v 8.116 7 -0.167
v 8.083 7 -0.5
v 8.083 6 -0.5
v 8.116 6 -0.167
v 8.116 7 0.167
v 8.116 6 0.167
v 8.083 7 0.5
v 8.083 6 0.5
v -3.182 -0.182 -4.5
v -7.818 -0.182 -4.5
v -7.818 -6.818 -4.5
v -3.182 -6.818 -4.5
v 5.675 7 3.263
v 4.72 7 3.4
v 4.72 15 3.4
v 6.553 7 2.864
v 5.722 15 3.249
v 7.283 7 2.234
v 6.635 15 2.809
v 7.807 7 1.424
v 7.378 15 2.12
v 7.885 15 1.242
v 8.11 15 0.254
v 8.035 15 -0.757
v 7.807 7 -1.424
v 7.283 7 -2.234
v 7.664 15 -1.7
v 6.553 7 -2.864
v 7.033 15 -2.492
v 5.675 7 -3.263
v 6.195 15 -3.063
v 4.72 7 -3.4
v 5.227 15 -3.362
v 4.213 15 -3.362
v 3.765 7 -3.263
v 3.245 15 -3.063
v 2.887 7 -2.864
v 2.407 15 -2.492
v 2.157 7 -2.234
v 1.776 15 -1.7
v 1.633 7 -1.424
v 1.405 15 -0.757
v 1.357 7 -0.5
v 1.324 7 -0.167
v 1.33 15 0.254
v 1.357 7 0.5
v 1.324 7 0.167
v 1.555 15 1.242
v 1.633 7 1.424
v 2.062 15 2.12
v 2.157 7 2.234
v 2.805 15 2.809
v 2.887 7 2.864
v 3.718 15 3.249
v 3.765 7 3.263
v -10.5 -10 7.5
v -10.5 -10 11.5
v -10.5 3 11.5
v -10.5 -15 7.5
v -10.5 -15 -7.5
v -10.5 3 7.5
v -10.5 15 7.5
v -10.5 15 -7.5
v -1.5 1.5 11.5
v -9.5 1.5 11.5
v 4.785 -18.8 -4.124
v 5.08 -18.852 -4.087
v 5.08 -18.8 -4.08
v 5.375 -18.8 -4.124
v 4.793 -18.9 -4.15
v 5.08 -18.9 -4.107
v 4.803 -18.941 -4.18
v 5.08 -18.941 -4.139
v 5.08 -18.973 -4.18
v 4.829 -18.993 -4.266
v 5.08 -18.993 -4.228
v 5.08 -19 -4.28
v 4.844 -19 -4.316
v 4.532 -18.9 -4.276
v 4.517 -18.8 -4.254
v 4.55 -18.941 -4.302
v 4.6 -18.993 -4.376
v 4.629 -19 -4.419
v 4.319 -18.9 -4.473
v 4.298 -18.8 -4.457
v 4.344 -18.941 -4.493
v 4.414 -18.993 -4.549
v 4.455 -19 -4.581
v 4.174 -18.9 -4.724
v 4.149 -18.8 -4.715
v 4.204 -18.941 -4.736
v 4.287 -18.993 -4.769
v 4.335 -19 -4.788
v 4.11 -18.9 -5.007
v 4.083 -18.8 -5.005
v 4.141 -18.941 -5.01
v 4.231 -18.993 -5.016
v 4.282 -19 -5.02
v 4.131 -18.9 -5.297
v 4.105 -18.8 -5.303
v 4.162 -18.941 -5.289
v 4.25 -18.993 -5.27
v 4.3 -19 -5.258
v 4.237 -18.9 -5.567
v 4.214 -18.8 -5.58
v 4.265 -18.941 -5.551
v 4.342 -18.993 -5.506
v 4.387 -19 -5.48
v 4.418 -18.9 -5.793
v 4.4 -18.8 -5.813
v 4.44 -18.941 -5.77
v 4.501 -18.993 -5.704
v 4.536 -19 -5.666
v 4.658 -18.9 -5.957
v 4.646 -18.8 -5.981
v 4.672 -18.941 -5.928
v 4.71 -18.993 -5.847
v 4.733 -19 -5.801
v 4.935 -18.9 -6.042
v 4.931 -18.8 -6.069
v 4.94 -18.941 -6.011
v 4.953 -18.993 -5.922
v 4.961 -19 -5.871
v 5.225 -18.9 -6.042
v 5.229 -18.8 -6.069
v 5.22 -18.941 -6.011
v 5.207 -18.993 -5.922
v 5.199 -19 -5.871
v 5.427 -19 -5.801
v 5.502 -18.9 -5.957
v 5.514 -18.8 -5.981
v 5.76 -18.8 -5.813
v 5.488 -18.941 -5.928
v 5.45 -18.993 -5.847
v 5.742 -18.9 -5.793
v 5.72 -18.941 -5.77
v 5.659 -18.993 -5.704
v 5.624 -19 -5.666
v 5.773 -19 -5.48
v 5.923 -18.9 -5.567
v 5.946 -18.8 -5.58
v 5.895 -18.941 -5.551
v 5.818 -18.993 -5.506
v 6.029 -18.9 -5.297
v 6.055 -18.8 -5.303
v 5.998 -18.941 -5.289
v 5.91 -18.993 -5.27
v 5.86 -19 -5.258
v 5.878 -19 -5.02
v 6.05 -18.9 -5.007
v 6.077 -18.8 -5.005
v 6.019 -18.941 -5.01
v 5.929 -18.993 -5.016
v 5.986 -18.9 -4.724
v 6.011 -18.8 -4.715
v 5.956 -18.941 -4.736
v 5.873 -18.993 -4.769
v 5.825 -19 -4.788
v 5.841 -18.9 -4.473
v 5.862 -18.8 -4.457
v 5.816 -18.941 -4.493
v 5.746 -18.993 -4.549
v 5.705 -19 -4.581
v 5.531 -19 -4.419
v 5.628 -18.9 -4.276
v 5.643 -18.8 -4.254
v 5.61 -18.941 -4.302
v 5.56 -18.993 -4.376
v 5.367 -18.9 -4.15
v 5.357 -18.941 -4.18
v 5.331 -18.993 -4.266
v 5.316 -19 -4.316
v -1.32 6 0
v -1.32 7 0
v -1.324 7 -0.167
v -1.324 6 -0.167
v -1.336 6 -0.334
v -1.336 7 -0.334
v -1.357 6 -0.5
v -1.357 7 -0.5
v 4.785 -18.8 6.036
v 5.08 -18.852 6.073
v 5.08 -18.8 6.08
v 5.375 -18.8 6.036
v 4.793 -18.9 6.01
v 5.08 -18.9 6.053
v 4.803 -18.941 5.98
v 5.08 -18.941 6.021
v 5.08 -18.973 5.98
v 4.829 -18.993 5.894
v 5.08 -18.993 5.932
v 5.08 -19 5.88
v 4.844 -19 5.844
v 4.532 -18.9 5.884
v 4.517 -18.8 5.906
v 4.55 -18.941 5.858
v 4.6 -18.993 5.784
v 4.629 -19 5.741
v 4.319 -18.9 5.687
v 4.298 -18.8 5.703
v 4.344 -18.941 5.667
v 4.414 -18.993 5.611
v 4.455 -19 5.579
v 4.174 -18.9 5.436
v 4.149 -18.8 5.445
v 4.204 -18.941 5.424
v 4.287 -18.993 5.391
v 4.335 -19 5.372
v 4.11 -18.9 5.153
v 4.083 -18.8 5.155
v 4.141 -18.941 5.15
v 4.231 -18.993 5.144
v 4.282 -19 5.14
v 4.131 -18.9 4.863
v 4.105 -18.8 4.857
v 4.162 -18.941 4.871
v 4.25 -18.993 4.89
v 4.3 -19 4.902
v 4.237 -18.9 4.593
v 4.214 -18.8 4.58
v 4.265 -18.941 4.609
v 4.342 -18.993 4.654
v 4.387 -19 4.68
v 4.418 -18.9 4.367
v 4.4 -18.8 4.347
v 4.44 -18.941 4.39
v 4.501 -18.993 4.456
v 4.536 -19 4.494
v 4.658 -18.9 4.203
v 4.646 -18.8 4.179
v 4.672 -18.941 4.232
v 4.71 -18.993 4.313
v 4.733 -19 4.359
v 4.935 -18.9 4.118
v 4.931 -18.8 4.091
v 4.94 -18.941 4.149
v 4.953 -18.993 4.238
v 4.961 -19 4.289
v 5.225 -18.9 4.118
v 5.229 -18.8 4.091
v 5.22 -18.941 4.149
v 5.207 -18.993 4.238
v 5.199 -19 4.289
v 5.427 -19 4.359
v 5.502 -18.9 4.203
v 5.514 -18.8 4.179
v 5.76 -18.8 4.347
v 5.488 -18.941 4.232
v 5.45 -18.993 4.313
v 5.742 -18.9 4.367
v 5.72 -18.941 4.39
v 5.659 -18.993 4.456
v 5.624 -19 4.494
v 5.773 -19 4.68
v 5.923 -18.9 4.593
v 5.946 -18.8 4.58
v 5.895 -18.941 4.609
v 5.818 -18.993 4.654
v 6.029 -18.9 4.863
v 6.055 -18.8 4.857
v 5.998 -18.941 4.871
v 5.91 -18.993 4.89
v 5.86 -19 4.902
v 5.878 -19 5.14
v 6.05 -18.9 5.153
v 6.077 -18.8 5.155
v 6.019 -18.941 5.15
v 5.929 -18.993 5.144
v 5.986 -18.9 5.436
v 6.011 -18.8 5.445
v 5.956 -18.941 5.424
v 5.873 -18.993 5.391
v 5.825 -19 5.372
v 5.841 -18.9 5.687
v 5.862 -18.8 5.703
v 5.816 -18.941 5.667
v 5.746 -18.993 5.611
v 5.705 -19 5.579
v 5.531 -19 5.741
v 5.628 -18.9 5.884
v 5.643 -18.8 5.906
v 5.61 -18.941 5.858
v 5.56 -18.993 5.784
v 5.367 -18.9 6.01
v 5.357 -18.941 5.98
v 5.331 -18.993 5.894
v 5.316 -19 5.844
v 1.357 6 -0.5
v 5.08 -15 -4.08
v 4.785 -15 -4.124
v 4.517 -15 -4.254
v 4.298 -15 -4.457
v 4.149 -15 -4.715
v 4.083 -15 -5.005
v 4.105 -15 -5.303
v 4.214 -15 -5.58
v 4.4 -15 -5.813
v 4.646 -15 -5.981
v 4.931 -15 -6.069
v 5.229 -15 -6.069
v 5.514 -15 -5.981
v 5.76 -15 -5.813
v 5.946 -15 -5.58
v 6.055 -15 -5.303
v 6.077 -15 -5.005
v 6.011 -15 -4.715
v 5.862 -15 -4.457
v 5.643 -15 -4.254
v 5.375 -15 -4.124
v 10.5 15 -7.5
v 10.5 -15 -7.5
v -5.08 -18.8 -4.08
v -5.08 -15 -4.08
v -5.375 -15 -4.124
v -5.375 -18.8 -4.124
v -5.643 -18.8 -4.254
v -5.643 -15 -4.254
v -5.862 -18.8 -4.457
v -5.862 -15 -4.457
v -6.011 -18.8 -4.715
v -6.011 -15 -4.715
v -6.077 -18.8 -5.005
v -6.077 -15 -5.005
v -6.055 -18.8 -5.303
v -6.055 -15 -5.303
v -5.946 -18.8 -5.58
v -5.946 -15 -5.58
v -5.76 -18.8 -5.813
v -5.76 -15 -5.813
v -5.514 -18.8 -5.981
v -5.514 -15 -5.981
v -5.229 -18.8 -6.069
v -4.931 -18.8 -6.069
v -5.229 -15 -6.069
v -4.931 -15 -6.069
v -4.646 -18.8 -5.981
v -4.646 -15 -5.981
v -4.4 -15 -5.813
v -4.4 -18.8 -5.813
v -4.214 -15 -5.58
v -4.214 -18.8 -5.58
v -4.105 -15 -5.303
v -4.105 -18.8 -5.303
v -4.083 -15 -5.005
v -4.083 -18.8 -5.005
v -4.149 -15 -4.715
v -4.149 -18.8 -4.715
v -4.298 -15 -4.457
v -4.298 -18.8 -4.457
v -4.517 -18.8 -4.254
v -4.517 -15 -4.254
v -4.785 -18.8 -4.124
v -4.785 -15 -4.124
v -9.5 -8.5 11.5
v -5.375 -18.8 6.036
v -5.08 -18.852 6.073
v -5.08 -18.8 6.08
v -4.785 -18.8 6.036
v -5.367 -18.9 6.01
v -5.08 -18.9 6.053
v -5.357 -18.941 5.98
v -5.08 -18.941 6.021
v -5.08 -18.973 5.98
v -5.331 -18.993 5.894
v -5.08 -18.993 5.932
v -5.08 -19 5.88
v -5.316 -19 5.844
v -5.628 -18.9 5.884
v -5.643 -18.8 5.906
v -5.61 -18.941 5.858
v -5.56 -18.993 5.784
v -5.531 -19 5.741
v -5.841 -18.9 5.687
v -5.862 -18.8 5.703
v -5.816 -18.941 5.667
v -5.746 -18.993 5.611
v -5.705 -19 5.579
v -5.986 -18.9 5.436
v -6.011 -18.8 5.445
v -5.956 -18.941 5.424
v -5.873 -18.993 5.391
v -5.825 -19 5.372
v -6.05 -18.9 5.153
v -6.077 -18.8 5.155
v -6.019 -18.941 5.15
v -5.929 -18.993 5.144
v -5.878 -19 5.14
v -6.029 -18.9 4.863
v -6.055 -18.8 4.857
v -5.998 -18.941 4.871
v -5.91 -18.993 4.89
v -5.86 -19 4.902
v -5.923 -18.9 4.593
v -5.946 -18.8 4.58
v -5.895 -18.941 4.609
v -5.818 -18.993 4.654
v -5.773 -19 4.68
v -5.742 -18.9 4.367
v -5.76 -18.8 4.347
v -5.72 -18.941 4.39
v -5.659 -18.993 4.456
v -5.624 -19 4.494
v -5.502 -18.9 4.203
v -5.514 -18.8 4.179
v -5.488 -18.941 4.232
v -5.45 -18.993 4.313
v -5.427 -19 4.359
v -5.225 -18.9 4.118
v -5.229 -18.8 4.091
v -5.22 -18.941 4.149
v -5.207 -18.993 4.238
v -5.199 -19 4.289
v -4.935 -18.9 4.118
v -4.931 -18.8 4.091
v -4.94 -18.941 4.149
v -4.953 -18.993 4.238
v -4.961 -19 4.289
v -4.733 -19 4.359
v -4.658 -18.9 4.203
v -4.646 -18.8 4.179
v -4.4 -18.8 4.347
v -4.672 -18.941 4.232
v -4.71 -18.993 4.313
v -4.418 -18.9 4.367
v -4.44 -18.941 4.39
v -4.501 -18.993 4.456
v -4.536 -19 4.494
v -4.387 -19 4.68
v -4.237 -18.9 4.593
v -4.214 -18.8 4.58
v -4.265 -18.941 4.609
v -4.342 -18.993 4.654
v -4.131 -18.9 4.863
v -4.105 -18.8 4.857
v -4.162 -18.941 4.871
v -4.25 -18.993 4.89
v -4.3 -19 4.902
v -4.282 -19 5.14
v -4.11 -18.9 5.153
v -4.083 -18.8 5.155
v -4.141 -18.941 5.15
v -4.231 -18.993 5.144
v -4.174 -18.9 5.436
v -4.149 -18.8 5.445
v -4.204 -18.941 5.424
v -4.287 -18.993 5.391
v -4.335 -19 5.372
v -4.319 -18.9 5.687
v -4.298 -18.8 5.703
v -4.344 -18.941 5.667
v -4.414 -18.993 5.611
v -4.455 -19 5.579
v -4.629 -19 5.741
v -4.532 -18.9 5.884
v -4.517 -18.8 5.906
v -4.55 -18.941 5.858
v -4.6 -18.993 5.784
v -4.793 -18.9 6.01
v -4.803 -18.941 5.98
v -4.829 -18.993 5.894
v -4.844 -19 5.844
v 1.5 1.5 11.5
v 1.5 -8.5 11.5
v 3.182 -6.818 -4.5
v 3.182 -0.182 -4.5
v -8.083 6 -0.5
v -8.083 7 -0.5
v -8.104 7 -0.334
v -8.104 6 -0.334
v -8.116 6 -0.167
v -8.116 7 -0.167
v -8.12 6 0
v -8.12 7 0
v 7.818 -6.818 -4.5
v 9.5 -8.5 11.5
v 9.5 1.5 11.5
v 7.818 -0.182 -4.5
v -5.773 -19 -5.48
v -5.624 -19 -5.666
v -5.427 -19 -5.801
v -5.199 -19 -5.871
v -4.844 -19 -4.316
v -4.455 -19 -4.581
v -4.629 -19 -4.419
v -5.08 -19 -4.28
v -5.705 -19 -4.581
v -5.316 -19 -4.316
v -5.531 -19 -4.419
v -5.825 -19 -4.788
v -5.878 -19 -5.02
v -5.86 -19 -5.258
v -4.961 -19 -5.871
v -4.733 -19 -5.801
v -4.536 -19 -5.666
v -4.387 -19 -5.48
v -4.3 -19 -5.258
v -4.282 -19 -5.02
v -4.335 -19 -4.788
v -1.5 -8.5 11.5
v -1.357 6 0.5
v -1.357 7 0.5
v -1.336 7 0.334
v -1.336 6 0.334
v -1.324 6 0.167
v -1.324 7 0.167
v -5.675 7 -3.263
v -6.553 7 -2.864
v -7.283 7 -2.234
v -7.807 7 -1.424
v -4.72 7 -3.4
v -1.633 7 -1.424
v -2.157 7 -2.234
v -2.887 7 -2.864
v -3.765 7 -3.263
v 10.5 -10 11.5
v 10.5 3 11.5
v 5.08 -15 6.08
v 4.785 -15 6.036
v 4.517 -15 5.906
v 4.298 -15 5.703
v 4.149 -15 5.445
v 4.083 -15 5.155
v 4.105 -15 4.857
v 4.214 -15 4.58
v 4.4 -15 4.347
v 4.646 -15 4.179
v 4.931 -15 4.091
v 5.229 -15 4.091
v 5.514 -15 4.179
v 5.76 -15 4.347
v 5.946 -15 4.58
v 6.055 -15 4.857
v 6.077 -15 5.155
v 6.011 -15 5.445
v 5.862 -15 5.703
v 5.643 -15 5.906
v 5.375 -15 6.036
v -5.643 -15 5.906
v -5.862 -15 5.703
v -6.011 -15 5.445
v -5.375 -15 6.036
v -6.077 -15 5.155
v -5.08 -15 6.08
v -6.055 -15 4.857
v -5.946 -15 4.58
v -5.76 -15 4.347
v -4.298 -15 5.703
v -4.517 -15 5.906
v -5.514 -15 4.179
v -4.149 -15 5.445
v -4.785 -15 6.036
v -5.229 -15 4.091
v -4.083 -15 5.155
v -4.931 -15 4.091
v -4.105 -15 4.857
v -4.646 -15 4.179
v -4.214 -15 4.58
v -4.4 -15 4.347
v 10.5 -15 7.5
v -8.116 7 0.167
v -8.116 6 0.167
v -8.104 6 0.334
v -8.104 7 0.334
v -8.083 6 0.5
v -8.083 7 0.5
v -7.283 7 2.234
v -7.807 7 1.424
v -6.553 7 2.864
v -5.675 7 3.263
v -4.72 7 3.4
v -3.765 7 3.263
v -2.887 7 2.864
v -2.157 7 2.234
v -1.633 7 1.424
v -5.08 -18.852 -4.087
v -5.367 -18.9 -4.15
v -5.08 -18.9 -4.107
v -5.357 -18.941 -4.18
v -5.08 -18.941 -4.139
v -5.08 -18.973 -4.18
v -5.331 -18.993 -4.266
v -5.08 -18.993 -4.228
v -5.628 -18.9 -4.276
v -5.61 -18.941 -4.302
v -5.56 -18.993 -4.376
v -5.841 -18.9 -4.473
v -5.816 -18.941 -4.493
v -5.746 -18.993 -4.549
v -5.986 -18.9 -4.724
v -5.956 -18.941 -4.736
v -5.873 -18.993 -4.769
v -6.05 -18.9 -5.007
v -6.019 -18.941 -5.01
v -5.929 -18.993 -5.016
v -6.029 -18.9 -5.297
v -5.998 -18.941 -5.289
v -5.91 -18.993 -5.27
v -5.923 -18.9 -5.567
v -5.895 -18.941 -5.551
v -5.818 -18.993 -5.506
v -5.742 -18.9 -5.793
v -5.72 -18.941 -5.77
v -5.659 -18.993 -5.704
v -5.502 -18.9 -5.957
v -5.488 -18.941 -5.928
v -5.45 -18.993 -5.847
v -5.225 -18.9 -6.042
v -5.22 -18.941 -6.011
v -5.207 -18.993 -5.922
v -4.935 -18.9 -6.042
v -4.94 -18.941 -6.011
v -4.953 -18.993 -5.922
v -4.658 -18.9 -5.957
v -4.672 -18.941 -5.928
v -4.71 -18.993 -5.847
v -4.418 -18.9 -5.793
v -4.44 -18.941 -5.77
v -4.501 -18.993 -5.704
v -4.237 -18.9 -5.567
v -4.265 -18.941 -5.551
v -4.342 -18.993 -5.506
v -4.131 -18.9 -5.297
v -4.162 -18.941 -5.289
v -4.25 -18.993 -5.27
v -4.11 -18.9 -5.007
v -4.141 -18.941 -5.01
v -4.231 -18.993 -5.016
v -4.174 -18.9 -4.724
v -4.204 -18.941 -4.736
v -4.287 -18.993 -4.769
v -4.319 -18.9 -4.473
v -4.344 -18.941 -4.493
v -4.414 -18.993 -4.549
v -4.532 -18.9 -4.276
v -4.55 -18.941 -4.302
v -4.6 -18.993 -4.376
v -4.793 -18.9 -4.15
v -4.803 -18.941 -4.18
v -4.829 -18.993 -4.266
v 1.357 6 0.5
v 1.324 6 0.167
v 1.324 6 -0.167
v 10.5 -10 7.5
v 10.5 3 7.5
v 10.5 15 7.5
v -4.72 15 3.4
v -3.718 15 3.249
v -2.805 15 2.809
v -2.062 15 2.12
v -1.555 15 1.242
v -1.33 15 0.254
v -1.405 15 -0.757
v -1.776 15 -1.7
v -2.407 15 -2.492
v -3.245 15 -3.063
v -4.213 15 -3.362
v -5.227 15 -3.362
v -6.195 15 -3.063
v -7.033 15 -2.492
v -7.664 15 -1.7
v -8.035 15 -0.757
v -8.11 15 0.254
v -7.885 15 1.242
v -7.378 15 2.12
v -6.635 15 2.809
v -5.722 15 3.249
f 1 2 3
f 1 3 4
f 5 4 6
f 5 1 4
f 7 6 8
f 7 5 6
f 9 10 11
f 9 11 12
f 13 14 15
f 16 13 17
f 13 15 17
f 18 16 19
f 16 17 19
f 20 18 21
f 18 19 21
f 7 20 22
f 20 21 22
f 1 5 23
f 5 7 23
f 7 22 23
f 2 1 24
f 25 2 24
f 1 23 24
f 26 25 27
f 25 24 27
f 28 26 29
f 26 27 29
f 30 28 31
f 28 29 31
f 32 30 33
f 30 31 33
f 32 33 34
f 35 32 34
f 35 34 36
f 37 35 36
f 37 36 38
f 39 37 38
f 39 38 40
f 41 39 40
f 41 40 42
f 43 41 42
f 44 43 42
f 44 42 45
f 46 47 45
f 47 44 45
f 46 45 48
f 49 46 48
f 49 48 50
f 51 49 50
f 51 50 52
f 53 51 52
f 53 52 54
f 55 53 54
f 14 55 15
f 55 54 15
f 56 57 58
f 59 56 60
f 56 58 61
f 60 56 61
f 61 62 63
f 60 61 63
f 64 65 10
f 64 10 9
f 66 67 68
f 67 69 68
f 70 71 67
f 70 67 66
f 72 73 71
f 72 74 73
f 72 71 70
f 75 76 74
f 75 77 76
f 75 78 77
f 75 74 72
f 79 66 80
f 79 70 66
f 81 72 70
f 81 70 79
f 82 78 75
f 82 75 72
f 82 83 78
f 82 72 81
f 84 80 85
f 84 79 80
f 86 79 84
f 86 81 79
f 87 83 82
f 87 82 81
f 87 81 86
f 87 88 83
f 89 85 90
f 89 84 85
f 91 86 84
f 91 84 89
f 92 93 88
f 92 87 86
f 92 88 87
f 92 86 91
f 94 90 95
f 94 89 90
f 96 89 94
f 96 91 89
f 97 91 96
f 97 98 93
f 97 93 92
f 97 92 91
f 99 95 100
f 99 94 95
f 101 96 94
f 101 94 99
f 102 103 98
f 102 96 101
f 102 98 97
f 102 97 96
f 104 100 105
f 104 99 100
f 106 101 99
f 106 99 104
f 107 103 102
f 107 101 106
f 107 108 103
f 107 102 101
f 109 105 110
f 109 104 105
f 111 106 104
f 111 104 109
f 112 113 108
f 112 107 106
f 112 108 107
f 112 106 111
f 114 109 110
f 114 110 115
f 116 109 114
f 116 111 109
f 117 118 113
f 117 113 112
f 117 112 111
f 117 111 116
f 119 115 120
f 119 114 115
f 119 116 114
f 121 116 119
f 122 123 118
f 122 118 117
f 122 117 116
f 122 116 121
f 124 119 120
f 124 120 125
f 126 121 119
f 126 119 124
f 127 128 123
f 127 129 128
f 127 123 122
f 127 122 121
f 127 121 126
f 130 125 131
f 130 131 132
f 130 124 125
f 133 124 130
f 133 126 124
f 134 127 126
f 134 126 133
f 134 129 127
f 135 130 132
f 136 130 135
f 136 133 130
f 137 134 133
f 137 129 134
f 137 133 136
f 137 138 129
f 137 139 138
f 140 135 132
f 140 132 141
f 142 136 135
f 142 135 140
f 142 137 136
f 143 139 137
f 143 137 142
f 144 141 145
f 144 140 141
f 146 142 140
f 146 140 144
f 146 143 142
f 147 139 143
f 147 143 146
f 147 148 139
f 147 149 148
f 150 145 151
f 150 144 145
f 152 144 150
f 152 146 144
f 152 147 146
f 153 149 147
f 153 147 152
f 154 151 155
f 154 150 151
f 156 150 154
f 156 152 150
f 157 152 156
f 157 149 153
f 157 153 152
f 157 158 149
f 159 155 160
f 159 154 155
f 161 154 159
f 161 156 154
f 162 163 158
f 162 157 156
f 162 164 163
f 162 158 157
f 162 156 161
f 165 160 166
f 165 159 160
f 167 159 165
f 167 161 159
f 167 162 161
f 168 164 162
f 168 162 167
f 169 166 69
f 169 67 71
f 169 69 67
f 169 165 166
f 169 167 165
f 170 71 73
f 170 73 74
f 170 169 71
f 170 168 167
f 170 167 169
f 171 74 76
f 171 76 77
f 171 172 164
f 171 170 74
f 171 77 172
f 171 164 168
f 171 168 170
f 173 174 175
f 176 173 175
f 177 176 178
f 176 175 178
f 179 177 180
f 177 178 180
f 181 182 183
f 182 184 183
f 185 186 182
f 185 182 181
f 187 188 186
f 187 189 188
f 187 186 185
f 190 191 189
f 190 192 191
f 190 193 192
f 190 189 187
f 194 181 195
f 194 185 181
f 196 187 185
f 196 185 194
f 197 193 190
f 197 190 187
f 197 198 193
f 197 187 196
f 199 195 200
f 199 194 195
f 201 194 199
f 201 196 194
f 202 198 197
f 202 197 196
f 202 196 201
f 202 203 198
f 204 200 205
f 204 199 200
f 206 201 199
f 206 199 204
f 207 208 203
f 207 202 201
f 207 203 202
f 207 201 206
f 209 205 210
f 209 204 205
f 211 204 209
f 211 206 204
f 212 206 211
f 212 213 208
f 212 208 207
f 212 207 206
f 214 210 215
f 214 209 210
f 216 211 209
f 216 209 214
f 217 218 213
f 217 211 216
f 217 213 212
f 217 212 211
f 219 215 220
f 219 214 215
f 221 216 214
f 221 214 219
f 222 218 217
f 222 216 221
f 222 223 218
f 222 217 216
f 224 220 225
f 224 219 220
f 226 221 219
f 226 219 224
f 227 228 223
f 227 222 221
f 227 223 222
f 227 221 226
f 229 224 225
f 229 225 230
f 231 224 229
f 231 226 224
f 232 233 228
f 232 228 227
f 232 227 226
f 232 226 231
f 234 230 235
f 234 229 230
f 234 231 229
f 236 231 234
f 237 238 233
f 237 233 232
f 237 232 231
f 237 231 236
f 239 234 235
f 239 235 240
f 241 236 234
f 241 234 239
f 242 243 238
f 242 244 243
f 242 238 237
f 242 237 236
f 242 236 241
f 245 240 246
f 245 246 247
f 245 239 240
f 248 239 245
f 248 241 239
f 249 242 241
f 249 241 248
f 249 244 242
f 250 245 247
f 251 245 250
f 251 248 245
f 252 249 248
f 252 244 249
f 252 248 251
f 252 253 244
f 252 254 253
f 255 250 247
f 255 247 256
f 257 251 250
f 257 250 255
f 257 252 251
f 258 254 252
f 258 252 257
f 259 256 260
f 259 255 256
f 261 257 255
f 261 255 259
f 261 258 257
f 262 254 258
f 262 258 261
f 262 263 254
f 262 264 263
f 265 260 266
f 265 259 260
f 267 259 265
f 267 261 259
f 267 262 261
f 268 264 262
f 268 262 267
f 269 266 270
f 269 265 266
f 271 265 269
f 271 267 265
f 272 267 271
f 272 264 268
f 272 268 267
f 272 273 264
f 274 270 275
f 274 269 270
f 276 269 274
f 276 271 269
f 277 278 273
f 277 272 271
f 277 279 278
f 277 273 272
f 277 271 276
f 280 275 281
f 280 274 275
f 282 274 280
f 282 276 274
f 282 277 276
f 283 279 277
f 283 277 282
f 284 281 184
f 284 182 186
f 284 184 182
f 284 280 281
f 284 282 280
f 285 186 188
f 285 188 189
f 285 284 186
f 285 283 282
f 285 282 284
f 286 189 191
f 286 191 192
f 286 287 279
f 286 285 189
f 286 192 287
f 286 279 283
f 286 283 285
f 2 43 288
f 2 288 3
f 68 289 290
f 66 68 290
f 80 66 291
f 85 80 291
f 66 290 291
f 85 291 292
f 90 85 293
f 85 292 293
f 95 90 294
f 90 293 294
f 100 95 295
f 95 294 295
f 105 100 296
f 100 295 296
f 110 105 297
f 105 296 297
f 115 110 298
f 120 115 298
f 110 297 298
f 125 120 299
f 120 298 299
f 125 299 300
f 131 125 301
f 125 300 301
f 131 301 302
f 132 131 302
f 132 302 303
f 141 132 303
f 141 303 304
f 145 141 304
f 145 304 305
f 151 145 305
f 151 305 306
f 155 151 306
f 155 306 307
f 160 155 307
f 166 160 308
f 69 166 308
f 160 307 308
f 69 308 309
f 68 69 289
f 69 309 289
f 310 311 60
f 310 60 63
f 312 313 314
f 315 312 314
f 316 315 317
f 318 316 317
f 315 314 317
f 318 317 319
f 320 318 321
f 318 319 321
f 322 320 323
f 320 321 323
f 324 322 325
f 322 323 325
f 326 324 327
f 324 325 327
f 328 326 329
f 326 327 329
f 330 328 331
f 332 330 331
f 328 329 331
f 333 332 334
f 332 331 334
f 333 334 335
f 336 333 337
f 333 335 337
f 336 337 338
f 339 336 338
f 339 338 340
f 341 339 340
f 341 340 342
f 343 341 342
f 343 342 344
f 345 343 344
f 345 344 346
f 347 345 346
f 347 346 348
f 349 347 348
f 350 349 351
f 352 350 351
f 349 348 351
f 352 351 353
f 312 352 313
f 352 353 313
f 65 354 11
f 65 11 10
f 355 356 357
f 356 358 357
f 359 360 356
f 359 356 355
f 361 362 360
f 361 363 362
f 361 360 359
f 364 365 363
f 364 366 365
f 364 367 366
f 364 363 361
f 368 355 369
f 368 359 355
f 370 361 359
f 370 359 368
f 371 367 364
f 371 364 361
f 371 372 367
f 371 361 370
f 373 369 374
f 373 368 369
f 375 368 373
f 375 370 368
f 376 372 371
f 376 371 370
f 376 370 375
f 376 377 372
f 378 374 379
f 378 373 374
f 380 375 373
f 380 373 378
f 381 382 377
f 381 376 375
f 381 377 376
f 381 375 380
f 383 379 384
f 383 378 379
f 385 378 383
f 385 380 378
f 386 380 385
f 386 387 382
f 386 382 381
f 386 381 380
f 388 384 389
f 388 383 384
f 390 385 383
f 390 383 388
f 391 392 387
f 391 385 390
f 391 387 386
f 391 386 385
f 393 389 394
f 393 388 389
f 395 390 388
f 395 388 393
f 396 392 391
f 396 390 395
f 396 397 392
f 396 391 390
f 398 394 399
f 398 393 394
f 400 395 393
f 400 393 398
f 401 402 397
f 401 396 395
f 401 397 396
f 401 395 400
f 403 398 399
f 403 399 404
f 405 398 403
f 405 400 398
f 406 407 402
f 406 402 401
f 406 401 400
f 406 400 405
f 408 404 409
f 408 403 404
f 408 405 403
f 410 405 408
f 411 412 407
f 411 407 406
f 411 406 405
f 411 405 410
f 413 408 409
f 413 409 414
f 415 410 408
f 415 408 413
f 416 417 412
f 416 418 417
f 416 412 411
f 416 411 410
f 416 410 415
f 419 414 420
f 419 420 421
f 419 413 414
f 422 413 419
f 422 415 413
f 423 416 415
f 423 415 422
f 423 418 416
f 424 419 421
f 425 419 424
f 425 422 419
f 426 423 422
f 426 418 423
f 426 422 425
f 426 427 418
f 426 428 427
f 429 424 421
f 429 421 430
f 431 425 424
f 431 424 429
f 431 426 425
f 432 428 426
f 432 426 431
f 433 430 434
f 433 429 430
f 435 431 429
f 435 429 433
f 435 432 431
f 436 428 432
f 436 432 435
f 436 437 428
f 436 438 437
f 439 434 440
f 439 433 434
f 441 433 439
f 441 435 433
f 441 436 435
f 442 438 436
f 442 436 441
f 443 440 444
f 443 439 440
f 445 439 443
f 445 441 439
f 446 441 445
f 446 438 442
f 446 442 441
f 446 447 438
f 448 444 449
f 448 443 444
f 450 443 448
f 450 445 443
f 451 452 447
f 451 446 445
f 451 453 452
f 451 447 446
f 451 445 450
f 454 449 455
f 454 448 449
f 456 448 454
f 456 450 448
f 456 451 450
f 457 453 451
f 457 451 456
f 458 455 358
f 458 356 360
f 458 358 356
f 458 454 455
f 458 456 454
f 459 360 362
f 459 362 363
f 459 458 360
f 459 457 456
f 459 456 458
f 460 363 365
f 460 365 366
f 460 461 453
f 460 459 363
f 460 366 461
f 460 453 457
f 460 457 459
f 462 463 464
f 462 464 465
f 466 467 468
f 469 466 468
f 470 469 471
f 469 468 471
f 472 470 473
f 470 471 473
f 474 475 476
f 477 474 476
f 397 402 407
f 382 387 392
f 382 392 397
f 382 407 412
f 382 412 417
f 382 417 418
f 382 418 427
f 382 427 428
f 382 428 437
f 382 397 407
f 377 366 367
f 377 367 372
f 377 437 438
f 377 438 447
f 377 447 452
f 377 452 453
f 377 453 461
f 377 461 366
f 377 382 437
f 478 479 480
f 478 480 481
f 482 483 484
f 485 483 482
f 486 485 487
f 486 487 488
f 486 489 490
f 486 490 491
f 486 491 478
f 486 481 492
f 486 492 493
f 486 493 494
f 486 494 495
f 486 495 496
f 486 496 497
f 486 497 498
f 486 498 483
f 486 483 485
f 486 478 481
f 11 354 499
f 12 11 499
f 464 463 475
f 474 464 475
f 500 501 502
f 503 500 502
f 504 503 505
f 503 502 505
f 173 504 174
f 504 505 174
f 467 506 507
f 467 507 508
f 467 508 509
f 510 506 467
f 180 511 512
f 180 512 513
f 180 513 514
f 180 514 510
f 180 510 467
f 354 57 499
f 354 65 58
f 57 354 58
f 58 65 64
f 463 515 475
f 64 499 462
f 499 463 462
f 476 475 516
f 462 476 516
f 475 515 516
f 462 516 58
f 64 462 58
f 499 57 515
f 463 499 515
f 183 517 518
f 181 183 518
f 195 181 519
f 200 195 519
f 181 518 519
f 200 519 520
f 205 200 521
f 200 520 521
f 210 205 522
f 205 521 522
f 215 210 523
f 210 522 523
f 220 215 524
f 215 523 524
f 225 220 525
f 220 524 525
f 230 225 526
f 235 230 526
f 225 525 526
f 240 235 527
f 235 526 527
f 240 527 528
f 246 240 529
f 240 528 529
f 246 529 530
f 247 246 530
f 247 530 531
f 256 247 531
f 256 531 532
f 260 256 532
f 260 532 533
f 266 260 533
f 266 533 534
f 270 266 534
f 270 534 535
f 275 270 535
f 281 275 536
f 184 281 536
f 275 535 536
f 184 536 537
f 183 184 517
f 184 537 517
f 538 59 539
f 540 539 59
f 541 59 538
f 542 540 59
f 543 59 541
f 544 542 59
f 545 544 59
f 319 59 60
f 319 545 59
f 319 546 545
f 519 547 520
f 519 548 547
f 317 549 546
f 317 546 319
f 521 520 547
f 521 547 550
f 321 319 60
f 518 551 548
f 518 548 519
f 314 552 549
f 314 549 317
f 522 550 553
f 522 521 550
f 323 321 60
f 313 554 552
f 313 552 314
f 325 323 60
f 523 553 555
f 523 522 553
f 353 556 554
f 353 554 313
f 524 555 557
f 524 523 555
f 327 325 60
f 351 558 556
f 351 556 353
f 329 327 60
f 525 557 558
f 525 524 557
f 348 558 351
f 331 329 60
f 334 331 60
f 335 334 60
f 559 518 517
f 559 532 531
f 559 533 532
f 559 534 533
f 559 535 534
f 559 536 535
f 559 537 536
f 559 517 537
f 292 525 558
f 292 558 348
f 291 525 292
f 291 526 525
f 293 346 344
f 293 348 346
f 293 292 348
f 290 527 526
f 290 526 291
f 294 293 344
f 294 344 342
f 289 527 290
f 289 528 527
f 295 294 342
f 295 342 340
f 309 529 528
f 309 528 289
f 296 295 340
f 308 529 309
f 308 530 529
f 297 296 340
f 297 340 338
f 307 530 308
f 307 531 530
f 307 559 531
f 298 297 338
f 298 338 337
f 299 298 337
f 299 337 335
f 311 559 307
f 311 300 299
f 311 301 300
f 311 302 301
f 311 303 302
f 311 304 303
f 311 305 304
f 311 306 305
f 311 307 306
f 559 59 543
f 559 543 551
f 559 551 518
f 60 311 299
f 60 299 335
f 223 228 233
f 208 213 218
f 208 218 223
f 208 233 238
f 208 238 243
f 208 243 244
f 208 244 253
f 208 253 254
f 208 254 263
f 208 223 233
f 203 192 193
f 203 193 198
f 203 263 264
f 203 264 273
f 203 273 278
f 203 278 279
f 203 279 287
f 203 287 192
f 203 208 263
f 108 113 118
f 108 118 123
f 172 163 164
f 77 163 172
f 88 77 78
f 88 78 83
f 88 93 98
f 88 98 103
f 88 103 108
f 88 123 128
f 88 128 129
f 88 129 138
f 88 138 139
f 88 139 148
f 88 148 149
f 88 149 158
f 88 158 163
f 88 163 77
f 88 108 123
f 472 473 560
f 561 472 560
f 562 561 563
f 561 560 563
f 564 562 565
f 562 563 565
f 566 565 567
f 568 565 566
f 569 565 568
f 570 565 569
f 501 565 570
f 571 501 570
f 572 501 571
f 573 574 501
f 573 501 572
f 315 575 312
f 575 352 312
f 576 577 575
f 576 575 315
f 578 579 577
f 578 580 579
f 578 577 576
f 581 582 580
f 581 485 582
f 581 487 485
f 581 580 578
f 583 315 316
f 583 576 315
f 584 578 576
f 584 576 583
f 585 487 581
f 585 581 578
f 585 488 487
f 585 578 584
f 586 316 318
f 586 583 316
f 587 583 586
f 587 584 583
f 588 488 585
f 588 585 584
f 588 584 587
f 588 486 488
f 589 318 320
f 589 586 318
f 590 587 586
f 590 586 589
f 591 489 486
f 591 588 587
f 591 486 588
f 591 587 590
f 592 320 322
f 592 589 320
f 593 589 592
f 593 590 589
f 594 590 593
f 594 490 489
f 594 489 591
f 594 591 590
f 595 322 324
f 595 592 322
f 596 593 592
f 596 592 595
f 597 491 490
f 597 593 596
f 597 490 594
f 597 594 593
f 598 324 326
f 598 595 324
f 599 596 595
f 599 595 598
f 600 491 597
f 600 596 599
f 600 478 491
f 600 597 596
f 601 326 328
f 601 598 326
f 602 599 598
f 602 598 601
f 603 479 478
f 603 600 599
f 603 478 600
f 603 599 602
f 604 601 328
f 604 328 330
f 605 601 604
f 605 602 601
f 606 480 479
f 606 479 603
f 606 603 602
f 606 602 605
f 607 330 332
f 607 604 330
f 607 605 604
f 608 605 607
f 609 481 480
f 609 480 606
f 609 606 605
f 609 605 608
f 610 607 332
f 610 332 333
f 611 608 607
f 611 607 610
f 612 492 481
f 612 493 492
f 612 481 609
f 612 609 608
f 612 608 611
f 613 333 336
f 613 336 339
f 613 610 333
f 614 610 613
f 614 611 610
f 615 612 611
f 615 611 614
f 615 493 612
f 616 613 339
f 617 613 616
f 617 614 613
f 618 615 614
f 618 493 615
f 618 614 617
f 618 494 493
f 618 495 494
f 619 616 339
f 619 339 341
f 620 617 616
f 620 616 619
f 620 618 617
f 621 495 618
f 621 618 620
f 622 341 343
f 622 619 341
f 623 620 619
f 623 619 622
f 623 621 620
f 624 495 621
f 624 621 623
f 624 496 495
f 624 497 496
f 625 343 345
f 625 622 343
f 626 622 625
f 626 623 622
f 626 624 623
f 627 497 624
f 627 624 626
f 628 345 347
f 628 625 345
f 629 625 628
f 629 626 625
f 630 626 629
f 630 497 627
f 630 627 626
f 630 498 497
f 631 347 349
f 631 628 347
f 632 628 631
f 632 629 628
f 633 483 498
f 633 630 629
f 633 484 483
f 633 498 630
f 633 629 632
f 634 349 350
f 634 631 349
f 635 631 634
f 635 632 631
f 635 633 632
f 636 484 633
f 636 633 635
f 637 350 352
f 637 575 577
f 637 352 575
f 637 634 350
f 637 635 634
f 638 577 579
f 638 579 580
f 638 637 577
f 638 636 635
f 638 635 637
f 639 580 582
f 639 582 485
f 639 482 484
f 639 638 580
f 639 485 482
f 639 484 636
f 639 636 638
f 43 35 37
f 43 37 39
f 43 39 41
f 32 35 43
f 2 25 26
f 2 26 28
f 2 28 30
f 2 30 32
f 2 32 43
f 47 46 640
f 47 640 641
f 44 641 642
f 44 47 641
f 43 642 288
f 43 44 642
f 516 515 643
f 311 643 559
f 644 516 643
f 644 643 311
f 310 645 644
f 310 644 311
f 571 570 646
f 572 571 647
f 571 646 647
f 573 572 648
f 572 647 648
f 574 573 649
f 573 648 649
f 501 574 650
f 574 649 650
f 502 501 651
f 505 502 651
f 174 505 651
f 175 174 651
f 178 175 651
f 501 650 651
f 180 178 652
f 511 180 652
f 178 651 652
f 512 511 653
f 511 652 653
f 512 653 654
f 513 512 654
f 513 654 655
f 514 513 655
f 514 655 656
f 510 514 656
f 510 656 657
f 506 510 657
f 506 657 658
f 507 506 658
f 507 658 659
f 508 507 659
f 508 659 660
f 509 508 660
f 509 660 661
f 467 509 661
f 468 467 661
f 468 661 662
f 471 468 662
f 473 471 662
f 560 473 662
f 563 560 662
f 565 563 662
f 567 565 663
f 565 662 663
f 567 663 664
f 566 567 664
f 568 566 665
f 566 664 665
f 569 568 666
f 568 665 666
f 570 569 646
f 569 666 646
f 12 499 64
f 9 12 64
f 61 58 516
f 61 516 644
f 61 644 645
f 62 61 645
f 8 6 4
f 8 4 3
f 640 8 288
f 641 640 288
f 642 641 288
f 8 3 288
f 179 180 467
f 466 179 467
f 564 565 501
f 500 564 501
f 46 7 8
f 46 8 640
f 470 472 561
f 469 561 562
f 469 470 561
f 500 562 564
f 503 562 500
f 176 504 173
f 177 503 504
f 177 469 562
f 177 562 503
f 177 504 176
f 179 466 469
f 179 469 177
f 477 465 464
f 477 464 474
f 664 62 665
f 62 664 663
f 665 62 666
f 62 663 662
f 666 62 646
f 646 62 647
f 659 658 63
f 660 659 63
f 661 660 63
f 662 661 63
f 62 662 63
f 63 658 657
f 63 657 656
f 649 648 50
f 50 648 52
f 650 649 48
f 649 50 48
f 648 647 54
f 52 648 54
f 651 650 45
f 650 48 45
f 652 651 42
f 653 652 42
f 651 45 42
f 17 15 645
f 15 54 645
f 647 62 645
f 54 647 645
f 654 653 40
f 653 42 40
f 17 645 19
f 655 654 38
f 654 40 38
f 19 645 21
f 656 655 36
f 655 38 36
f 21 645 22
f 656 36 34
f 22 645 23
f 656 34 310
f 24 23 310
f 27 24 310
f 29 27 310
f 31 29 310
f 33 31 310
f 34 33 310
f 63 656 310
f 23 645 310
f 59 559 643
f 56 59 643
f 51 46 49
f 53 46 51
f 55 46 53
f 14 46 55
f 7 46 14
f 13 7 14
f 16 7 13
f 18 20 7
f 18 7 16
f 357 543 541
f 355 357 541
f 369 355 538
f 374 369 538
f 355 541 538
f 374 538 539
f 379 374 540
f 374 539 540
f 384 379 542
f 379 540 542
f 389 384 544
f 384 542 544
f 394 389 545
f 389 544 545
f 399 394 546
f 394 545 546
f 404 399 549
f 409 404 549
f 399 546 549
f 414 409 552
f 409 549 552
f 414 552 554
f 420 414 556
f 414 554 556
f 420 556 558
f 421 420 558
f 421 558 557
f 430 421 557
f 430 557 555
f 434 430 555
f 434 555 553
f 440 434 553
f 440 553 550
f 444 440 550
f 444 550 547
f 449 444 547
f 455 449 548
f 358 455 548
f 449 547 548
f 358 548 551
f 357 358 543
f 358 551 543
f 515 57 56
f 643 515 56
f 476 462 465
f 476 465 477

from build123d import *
from build123d.topology import SkipClean

# Parameters (mm, degrees)
SKETCH_1_W                    = 15
SKETCH_1_H                    = 30
SKETCH_1_W_2                  = 4
SKETCH_1_H_2                  = 13
EXTRUDE_1_DEPTH               = 10.5
SKETCH_3_R                    = 3.4
CUT_EXTRUDE_1_DEPTH           = 8
SKETCH_4_W                    = 8
SKETCH_4_H                    = 10
CUT_EXTRUDE_3_DEPTH           = 16
CUT_EXTRUDE_3_DRAFT           = -6
CUT_EXTRUDE_3_PROFILE_2_DEPTH = 16
CUT_EXTRUDE_3_PROFILE_2_DRAFT = -6
CUT_EXTRUDE_5_DEPTH           = 1
CUT_EXTRUDE_6_DEPTH           = 1
SKETCH_9_R                    = 1
EXTRUDE_2_DEPTH               = 4
FILLET_3_R                    = 0.2


with BuildPart() as part:
    # Эскиз1 → Бобышка-Вытянуть1 (new, symmetric)
    with BuildSketch(Plane(origin=(0, 0, 0), x_dir=(0, 0, -1), z_dir=(1, 0, 0))):
        Rectangle(SKETCH_1_W, SKETCH_1_H)
        with Locations((-9.5, -3.5)):
            Rectangle(SKETCH_1_W_2, SKETCH_1_H_2)
    extrude(amount=EXTRUDE_1_DEPTH, both=True)

    # Эскиз3 → Вырез-Вытянуть1 (cut)
    with BuildSketch(Plane(origin=(0, 15, 0), x_dir=(1, 0, 0), z_dir=(0, 1, 0))):
        with Locations(Location((-4.72, 0, 0), (0, 0, 270))):
            Circle(SKETCH_3_R)
        with Locations(Location((4.72, 0, 0), (0, 0, 270))):
            Circle(SKETCH_3_R)
    extrude(amount=-CUT_EXTRUDE_1_DEPTH, mode=Mode.SUBTRACT)


with BuildPart() as cut_extrude_3_tool:
    # Эскиз4 → Вырез-Вытянуть3 (with draft: the straight prism first)
    with BuildSketch(Plane.XY.offset(11.5)):
        with Locations((-5.5, -3.5)):
            Rectangle(SKETCH_4_W, SKETCH_4_H)
    extrude(amount=-CUT_EXTRUDE_3_DEPTH)
    # Вырез-Вытянуть3: the draft: its side faces are tilted about the plane it starts from
    cut_extrude_3_sides = [cut_extrude_3_tool.faces().sort_by_distance(p)[0] for p in [
        (-5.5, -8.5, 3.5),
        (-1.5, -3.5, 3.5),
        (-5.5, 1.5, 3.5),
        (-9.5, -3.5, 3.5),
    ]]
    draft(cut_extrude_3_sides, Plane.XY.offset(11.5), CUT_EXTRUDE_3_DRAFT)


with BuildPart() as part_1:
    add(part.part)

    # Вырез-Вытянуть3: cut by cut_extrude_3_tool
    add(cut_extrude_3_tool.part, mode=Mode.SUBTRACT)


with BuildPart() as cut_extrude_3_profile_2_tool:
    # Эскиз4 → Вырез-Вытянуть3 profile 2 (with draft: the straight prism first)
    with BuildSketch(Plane.XY.offset(11.5)):
        with Locations((5.5, -3.5)):
            Rectangle(SKETCH_4_W, SKETCH_4_H)
    extrude(amount=-CUT_EXTRUDE_3_PROFILE_2_DEPTH)
    # Вырез-Вытянуть3 profile 2: the draft: its side faces are tilted about the plane it starts from
    cut_extrude_3_profile_2_sides = [cut_extrude_3_profile_2_tool.faces().sort_by_distance(p)[0] for p in [
        (5.5, -8.5, 3.5),
        (9.5, -3.5, 3.5),
        (5.5, 1.5, 3.5),
        (1.5, -3.5, 3.5),
    ]]
    draft(cut_extrude_3_profile_2_sides, Plane.XY.offset(11.5), CUT_EXTRUDE_3_PROFILE_2_DRAFT)


with BuildPart() as part_2:
    add(part_1.part)

    # Вырез-Вытянуть3 profile 2: cut by cut_extrude_3_profile_2_tool
    add(cut_extrude_3_profile_2_tool.part, mode=Mode.SUBTRACT)

    # Эскиз7 → Вырез-Вытянуть5 (cut)
    with BuildSketch(Plane(origin=(0, 7, 0), x_dir=(1, 0, 0), z_dir=(0, 1, 0))):
        with BuildLine():
            ThreePointArc((-8.12, 1e-09), (-8.110745992, -0.250682298), (-8.083034344, -0.5))
            Line((-8.083034344, -0.5), (-1.356965656, -0.5))
            ThreePointArc((-1.356965656, -0.5), (-1.329254008, -0.250682299), (-1.32, 0))
            ThreePointArc((-1.32, 0), (-1.329254008, 0.250682299), (-1.356965656, 0.5))
            Line((-1.356965656, 0.5), (-8.083034344, 0.5))
            ThreePointArc((-8.083034344, 0.5), (-8.110745992, 0.250682299), (-8.12, 1e-09))
        make_face()
    extrude(amount=-CUT_EXTRUDE_5_DEPTH, mode=Mode.SUBTRACT)

    # Эскиз8 → Вырез-Вытянуть6 (cut)
    with SkipClean():  # the faces are left unmerged after this step: merging them gives an invalid solid
        with BuildSketch(Plane(origin=(0, 7, 0), x_dir=(1, 0, 0), z_dir=(0, 1, 0))):
            with BuildLine():
                Line((1.356965656, 0.5), (8.083034344, 0.5))
                ThreePointArc((8.083034344, 0.5), (8.12, 0), (8.083034344, -0.5))
                Line((8.083034344, -0.5), (1.356965656, -0.5))
                ThreePointArc((1.356965656, -0.5), (1.32, 0), (1.356965656, 0.5))
            make_face()
        extrude(amount=-CUT_EXTRUDE_6_DEPTH, mode=Mode.SUBTRACT)

    # Эскиз9 → Бобышка-Вытянуть2 (add)
    with SkipClean():  # the faces are left unmerged after this step: merging them gives an invalid solid
        with BuildSketch(Plane.XZ.offset(15)):
            with Locations(Location((-5.08, 5.08, 0), (0, 0, 90))):
                Circle(SKETCH_9_R)
            with Locations(Location((5.08, 5.08, 0), (0, 0, 90))):
                Circle(SKETCH_9_R)
            with Locations(Location((5.08, -5.08, 0), (0, 0, 90))):
                Circle(SKETCH_9_R)
            with Locations(Location((-5.08, -5.08, 0), (0, 0, 90))):
                Circle(SKETCH_9_R)
        extrude(amount=EXTRUDE_2_DEPTH)

    # Скругление3
    fillet_3_edges = [part_2.edges().sort_by_distance(p)[0] for p in [
        (-5.08, -19, -6.08),
        (-5.08, -19, 4.08),
        (5.08, -19, 4.08),
        (5.08, -19, -6.08),
    ]]
    fillet(fillet_3_edges, radius=FILLET_3_R)


solid = part_2.part
